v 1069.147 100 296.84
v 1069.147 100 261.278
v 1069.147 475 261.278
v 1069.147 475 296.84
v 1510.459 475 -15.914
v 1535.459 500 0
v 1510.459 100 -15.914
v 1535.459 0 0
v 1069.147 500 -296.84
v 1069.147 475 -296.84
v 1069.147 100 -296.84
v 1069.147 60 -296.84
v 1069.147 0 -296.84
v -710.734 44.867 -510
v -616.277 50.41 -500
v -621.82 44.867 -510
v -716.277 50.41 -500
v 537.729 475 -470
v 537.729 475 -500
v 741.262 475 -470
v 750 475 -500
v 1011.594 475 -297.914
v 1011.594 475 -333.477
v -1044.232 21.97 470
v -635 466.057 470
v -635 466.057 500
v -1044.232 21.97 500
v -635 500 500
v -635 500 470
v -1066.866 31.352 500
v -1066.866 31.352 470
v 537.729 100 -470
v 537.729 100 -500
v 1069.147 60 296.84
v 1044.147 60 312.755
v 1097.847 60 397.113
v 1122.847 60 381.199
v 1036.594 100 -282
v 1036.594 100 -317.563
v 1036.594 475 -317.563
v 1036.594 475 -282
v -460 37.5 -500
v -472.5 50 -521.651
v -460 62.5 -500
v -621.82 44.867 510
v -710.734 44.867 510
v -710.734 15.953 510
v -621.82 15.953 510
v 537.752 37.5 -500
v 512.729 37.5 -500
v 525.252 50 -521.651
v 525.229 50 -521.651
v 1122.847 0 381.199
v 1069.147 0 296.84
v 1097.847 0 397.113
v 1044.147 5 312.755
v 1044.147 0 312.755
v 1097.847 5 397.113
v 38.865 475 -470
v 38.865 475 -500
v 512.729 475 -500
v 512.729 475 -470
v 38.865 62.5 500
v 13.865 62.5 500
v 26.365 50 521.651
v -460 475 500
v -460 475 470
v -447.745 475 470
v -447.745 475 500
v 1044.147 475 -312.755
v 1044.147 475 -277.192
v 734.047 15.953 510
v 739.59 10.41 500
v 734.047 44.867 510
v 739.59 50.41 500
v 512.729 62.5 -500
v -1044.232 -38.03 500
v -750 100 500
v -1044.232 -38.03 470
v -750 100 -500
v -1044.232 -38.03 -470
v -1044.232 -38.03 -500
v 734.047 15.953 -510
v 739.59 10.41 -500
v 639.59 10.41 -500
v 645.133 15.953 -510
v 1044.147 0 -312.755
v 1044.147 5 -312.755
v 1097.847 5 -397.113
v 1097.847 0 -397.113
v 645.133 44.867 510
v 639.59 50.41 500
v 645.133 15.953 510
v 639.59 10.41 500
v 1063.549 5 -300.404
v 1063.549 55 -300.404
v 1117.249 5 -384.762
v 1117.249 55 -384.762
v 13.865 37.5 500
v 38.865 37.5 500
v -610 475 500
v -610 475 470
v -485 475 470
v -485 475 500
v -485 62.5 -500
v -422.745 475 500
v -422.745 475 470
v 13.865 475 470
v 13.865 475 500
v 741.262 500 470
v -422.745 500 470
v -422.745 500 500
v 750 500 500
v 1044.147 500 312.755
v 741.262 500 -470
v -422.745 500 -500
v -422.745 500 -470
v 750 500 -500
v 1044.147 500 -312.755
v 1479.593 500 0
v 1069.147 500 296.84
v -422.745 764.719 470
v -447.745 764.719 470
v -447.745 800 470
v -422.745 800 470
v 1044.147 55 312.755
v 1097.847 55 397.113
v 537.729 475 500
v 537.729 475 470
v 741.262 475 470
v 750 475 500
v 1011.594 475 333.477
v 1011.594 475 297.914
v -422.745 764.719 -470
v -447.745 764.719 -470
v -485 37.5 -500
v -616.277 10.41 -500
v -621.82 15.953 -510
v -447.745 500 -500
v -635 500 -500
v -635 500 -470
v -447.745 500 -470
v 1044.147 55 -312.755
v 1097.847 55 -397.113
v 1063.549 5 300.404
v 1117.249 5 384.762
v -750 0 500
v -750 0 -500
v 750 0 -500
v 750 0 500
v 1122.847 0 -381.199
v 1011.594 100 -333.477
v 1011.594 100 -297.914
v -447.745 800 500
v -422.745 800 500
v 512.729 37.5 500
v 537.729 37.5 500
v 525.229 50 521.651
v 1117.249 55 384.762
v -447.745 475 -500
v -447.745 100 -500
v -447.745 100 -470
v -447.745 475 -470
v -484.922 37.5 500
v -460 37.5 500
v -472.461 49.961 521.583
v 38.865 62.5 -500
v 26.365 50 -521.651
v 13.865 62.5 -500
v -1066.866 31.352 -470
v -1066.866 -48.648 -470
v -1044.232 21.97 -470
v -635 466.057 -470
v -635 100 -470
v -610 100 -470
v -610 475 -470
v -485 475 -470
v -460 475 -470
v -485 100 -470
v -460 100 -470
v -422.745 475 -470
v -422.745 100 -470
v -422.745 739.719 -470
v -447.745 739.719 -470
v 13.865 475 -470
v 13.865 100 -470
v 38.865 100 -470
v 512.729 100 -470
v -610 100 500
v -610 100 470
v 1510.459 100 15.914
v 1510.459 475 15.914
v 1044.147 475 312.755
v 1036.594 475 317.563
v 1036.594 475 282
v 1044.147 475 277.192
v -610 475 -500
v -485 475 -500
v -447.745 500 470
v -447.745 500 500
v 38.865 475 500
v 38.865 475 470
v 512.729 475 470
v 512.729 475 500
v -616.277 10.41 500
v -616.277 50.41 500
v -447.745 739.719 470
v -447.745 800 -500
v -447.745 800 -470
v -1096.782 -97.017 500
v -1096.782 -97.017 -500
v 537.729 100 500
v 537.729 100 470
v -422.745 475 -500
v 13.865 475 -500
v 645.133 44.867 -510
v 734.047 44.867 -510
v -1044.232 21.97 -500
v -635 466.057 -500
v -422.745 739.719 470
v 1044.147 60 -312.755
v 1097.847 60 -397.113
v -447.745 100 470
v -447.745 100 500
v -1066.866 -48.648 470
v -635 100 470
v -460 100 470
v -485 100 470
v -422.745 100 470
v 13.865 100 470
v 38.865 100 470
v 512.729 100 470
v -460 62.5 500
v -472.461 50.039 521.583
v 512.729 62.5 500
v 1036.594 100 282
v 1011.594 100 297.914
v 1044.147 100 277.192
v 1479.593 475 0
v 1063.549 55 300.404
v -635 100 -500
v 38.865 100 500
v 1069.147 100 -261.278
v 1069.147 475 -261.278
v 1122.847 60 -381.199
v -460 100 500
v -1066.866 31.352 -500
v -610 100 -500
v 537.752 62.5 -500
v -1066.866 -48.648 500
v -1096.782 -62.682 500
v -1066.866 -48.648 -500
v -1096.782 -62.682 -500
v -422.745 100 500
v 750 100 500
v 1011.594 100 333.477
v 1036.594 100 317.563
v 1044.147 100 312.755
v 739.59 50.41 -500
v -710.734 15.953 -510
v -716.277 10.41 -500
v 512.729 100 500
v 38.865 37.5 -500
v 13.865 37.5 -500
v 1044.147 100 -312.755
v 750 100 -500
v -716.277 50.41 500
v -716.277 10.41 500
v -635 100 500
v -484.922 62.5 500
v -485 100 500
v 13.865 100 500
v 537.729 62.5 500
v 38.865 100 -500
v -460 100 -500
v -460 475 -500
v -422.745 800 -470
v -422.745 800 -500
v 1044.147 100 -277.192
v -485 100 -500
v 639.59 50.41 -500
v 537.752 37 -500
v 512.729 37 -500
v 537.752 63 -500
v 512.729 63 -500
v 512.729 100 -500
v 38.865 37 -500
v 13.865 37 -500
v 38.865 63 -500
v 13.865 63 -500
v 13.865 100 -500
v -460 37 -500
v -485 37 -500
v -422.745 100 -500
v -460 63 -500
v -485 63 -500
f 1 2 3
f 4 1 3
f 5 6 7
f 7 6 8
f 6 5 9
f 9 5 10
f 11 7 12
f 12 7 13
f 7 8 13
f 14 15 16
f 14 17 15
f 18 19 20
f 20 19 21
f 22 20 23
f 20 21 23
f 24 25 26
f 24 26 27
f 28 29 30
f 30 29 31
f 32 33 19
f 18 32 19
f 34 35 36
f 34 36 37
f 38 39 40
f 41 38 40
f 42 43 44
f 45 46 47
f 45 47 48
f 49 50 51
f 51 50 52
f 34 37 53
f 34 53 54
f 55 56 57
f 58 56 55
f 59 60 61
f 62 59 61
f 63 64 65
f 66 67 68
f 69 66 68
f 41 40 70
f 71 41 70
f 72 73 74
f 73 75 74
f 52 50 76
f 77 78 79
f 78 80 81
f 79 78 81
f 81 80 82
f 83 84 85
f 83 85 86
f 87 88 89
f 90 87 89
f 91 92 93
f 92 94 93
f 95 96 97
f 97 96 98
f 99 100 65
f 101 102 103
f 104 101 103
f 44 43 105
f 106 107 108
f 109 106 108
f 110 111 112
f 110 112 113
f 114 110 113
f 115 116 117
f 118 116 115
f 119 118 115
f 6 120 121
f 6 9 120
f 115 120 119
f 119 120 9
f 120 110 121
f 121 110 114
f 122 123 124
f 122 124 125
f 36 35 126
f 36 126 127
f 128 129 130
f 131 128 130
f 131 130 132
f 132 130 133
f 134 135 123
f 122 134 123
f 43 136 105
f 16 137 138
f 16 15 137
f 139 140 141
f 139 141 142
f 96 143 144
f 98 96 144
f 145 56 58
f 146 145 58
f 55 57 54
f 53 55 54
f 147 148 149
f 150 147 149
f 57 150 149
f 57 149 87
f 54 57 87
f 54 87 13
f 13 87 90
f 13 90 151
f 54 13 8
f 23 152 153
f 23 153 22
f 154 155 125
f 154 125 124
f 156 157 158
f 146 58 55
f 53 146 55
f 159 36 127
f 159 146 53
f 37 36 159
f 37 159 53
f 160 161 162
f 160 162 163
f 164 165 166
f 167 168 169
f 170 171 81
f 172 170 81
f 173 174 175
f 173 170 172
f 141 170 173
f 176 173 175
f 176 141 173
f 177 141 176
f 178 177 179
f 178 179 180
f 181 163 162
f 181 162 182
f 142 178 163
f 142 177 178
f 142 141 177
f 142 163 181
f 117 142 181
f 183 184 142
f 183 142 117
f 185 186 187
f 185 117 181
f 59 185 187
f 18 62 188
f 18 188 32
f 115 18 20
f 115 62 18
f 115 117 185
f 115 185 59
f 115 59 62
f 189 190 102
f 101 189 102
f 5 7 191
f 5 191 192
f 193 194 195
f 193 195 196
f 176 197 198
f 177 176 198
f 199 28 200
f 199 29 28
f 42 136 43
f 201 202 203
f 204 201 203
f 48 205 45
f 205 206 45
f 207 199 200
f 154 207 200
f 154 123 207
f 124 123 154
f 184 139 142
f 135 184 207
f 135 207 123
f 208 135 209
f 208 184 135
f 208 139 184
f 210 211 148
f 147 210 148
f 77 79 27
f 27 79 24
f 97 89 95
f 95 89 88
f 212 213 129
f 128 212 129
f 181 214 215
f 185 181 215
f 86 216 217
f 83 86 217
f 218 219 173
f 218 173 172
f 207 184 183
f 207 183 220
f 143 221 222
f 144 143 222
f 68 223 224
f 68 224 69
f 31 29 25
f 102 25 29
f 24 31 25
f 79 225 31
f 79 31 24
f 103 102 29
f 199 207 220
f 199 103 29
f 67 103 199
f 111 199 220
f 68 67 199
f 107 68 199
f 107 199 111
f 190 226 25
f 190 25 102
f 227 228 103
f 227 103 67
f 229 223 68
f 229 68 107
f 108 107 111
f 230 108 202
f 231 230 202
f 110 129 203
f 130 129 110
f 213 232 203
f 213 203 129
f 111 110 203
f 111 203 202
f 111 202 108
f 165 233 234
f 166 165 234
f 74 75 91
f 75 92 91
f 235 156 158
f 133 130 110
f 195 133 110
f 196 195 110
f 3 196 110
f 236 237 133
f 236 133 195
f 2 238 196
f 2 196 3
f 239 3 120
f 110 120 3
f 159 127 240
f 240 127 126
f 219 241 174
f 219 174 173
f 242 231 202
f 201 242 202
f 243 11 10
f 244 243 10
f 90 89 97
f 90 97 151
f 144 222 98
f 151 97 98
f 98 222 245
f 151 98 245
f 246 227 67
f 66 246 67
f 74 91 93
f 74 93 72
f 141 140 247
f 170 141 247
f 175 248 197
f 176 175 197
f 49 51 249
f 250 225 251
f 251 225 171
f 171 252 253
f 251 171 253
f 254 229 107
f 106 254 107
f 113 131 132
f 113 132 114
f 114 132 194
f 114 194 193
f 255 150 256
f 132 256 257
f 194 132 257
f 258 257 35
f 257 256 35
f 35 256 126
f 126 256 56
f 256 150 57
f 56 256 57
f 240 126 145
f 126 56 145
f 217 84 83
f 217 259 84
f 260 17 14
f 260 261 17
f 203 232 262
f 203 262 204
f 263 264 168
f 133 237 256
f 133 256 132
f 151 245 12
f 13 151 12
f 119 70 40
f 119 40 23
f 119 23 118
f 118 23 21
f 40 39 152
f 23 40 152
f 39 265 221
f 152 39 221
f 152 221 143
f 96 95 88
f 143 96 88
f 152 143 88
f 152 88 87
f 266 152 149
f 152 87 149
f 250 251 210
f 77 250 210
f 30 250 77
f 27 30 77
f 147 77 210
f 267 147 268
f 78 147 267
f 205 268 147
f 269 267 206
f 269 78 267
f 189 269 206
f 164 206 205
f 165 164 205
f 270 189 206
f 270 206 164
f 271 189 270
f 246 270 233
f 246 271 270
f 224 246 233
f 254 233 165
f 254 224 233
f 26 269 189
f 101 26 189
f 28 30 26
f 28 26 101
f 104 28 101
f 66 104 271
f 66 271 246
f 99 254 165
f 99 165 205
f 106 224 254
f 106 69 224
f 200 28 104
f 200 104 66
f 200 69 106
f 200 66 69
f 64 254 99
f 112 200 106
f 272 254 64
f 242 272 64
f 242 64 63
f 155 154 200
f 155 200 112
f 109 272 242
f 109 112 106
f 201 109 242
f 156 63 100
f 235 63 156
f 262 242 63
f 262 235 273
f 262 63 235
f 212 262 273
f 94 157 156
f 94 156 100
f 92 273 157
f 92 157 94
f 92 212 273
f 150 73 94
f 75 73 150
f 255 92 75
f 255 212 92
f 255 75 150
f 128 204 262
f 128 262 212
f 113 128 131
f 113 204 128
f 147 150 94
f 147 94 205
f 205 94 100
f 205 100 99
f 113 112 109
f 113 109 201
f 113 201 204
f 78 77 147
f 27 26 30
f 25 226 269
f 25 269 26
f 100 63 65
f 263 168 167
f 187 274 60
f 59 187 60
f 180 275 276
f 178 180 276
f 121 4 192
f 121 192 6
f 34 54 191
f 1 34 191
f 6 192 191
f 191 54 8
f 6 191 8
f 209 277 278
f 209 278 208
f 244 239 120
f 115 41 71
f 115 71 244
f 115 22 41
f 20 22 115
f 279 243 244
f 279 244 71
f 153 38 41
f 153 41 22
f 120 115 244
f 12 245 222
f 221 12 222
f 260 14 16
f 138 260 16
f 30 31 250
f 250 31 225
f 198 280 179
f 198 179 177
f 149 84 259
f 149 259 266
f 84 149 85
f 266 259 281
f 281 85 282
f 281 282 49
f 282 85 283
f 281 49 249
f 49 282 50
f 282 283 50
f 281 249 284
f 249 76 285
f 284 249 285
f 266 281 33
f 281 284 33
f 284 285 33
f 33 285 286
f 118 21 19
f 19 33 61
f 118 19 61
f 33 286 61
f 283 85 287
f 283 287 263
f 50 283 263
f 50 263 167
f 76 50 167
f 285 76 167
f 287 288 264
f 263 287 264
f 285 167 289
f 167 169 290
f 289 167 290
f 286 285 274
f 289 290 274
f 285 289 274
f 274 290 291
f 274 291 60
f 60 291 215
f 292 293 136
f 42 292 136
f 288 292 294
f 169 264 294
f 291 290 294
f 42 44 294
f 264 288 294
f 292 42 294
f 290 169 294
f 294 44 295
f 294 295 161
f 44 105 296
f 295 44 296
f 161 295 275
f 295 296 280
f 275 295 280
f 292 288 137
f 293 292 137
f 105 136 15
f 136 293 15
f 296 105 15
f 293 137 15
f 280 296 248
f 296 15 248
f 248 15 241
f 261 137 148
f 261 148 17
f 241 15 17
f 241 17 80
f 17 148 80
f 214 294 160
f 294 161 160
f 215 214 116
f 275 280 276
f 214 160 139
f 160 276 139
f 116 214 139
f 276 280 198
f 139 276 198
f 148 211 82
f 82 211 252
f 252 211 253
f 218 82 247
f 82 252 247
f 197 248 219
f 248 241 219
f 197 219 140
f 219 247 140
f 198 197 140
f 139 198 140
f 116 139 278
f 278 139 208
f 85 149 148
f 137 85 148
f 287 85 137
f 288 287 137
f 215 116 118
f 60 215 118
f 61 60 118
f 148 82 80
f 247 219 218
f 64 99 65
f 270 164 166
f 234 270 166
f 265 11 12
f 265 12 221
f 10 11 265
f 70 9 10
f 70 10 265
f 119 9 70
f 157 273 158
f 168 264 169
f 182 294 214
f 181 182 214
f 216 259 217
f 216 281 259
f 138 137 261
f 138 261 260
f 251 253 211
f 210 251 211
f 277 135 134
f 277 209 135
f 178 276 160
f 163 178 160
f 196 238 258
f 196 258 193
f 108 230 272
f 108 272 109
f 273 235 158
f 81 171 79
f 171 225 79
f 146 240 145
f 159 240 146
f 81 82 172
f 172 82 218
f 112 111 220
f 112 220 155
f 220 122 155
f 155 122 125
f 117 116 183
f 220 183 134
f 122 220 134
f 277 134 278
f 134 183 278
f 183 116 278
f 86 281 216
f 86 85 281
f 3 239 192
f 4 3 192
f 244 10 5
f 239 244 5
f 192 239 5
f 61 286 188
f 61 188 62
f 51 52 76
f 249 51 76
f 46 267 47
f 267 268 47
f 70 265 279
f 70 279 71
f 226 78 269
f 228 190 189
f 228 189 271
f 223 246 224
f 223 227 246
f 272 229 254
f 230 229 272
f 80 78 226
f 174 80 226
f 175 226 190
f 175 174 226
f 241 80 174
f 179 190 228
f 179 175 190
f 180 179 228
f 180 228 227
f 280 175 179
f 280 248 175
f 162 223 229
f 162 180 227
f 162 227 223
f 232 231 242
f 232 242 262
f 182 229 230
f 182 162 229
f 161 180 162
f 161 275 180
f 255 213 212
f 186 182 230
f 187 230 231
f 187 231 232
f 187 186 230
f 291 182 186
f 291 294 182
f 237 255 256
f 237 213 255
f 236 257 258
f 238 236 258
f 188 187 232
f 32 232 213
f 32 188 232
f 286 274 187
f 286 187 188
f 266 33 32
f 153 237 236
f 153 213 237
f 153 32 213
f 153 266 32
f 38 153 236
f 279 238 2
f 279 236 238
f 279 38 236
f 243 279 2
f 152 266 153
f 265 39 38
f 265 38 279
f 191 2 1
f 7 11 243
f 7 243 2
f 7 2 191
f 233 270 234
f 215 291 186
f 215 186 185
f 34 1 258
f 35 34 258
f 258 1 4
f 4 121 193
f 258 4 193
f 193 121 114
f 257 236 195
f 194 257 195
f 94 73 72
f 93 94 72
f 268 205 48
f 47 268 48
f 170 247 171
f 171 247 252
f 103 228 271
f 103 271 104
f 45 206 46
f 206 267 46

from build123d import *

# Parameters (mm, degrees)
BOSS_EXTRUDE1_DEPTH      = 500
BOSS_EXTRUDE2_DEPTH      = 500
BOSS_EXTRUDE2_DEPTH_BACK = 500
CUT_EXTRUDE1_START       = -500
CUT_EXTRUDE1_OUTLINE_W   = 473.864747831
CUT_EXTRUDE1_OUTLINE_H   = 375
CUT_EXTRUDE1_OUTLINE_W_2 = 7.552750907
CUT_EXTRUDE1_OUTLINE_W_3 = 441.311996924
CUT_EXTRUDE1_OUTLINE_W_4 = 436.609859473
CUT_EXTRUDE1_OUTLINE_W_5 = 473.864747832
CUT_EXTRUDE1_OUTLINE_W_6 = 12.254888358
CUT_EXTRUDE1_OUTLINE_W_7 = 125
CUT_EXTRUDE1_DEPTH       = 1000
BOSS_EXTRUDE3_DEPTH      = 100
CUT_EXTRUDE4_DEPTH       = 470
BOSS_EXTRUDE5_DEPTH      = 500
BOSS_EXTRUDE5_DEPTH_BACK = 500
CUT_EXTRUDE7_DEPTH       = 470
SKETCH10_W               = 1000
SKETCH10_H               = 25
BOSS_EXTRUDE6_DEPTH      = 25
SKETCH11_W               = 25
SKETCH11_H               = 25
SKETCH11_W_2             = 24.921787331
BOSS_EXTRUDE7_DEPTH      = 25
BOSS_EXTRUDE7_TAPER      = 30
BOSS_EXTRUDE8_START      = 525.229495663
BOSS_EXTRUDE8_DEPTH      = 0.022340747
BOSS_EXTRUDE8_START_2    = -485
BOSS_EXTRUDE8_2_DEPTH    = 25
BOSS_EXTRUDE8_START_3    = 13.864747831
BOSS_EXTRUDE8_3_DEPTH    = 25
BOSS_EXTRUDE8_START_4    = 512.729495663
BOSS_EXTRUDE8_4_DEPTH    = 25.022340747
BOSS_EXTRUDE8_START_5    = 37
BOSS_EXTRUDE8_5_DEPTH    = 26
BOSS_EXTRUDE10_DEPTH     = 500
CUT_EXTRUDE8_DEPTH       = 440
CUT_EXTRUDE9_DEPTH       = 23
CUT_EXTRUDE10_DEPTH      = 23
SKETCH20_W               = 100
SKETCH20_H               = 40
BOSS_EXTRUDE11_DEPTH     = 10
BOSS_EXTRUDE11_TAPER     = 29
SKETCH22_W               = 100
SKETCH22_H               = 40
BOSS_EXTRUDE12_DEPTH     = 10
BOSS_EXTRUDE12_TAPER     = 29


with BuildPart() as part:
    # Sketch3 → Boss-Extrude1 (new body)
    with BuildSketch(Plane(origin=(0, 0, 0), x_dir=(1, 0, 0), z_dir=(0, 1, 0))):
        Polygon((750, -500), (1535.458991325, 0), (750, 500), (-750, 500), (-750, -500), align=None)
        Polygon((741.261584038, -470), (1479.593035884, 0), (741.261584038, 470), (-720, 470), (-720, -470), align=None, mode=Mode.SUBTRACT)
    extrude(amount=BOSS_EXTRUDE1_DEPTH)

    # Sketch4 → Boss-Extrude2 (add, two sides: drawn at the far end of the back side and taken through both)
    with BuildSketch(Plane.XY.offset(-BOSS_EXTRUDE2_DEPTH_BACK)):
        Polygon((-750, 0), (-750, 100), (-1044.23243351, -38.029978885), (-1044.23243351, 21.970021115), (-635, 466.05675301), (-635, 500), (-1066.865697626, 31.352330432), (-1066.865697626, -48.647669568), (-1096.782201963, -62.68206548), (-1096.782201963, -97.017235637), align=None)
    extrude(amount=BOSS_EXTRUDE2_DEPTH + BOSS_EXTRUDE2_DEPTH_BACK)

    # Cut-Extrude1: read off the stored shape, not the designer's step
    # Cut-Extrude1 outline → Cut-Extrude1 (cut)
    with BuildSketch(Plane.XY.offset(CUT_EXTRUDE1_START)):
        Polygon((-635, 100), (-635, 466.05675301), (-750, 341.262210872), (-750, 100), align=None)
        with Locations((774.661869579, 287.5)):
            Rectangle(CUT_EXTRUDE1_OUTLINE_W, CUT_EXTRUDE1_OUTLINE_H)
        with Locations((1040.370618948, 287.5)):
            Rectangle(CUT_EXTRUDE1_OUTLINE_W_2, CUT_EXTRUDE1_OUTLINE_H)
        with Locations((1289.802992863, 287.5)):
            Rectangle(CUT_EXTRUDE1_OUTLINE_W_3, CUT_EXTRUDE1_OUTLINE_H)
        with Locations((-204.440181906, 287.5)):
            Rectangle(CUT_EXTRUDE1_OUTLINE_W_4, CUT_EXTRUDE1_OUTLINE_H)
        with Locations((275.797121747, 287.5)):
            Rectangle(CUT_EXTRUDE1_OUTLINE_W_5, CUT_EXTRUDE1_OUTLINE_H)
        with Locations((-453.872555821, 287.5)):
            Rectangle(CUT_EXTRUDE1_OUTLINE_W_6, CUT_EXTRUDE1_OUTLINE_H)
        with Locations((-547.5, 287.5)):
            Rectangle(CUT_EXTRUDE1_OUTLINE_W_7, CUT_EXTRUDE1_OUTLINE_H)
        Polygon((-750, 375.205457862), (-635, 500), (-750, 500), align=None)
    extrude(amount=CUT_EXTRUDE1_DEPTH, mode=Mode.SUBTRACT)

    # Sketch3<6> → Boss-Extrude3 (add)
    with BuildSketch(Plane(origin=(0, 0, 0), x_dir=(1, 0, 0), z_dir=(0, 1, 0))):
        Polygon((750, -500), (1535.458991325, 0), (750, 500), (-750, 500), (-750, -500), align=None)
    extrude(amount=BOSS_EXTRUDE3_DEPTH)

    # Sketch4<6> → Cut-Extrude4 (cut, symmetric)
    with BuildSketch(Plane.XY):
        Polygon((-1066.865697626, -48.647669568), (-1044.23243351, -38.029978885), (-1044.23243351, 21.970021115), (-750, 341.262210872), (-635, 466.05675301), (-635, 500), (-750, 375.205457862), (-1066.865697626, 31.352330432), align=None)
    extrude(amount=CUT_EXTRUDE4_DEPTH, both=True, mode=Mode.SUBTRACT)

    # Sketch4<7> → Boss-Extrude5 (add, two sides: drawn at the far end of the back side and taken through both)
    with BuildSketch(Plane.XY.offset(-BOSS_EXTRUDE5_DEPTH_BACK)):
        Polygon((-447.745111642, 475), (-447.745111642, 100), (-422.745111642, 100), (-422.745111642, 475), (-422.745111642, 500), (-422.745111642, 800), (-447.745111642, 800), (-447.745111642, 500), align=None)
    extrude(amount=BOSS_EXTRUDE5_DEPTH + BOSS_EXTRUDE5_DEPTH_BACK)

    # Sketch4<8> → Cut-Extrude7 (cut, symmetric)
    with BuildSketch(Plane.XY):
        Polygon((-447.745111642, 475), (-447.745111642, 100), (-422.745111642, 100), (-422.745111642, 475), (-422.745111642, 500), (-422.745111642, 800), (-447.745111642, 800), (-447.745111642, 500), align=None)
    extrude(amount=CUT_EXTRUDE7_DEPTH, both=True, mode=Mode.SUBTRACT)

    # Sketch10 → Boss-Extrude6 (add)
    with BuildSketch(Plane.ZY.offset(447.745111642)):
        with Locations((0, 752.218873566)):
            Rectangle(SKETCH10_W, SKETCH10_H)
    extrude(amount=-BOSS_EXTRUDE6_DEPTH)

    # Sketch11 → Boss-Extrude7 (add)
    with BuildSketch(Plane.XY.offset(500)):
        with Locations((525.229495663, 50)):
            Rectangle(SKETCH11_W, SKETCH11_H)
        with Locations((26.364747831, 50)):
            Rectangle(SKETCH11_W, SKETCH11_H)
        with Locations((-472.460893666, 50)):
            Rectangle(SKETCH11_W_2, SKETCH11_H)
    extrude(amount=BOSS_EXTRUDE7_DEPTH, taper=BOSS_EXTRUDE7_TAPER)

    # Boss-Extrude8: read off the stored shape, not the designer's step
    # Boss-Extrude8 outline → Boss-Extrude8 (add)
    with BuildSketch(Plane.YZ.offset(BOSS_EXTRUDE8_START)):
        Polygon((62.5, -500), (37.5, -500), (50, -521.650635095), align=None)
    extrude(amount=BOSS_EXTRUDE8_DEPTH)

    # Boss-Extrude8 2 outline → Boss-Extrude8 2 (add)
    with BuildSketch(Plane.YZ.offset(BOSS_EXTRUDE8_START_2)):
        Polygon((62.5, -500), (37.5, -500), (50, -521.650635095), align=None)
    extrude(amount=BOSS_EXTRUDE8_2_DEPTH)

    # Boss-Extrude8 3 outline → Boss-Extrude8 3 (add)
    with BuildSketch(Plane.YZ.offset(BOSS_EXTRUDE8_START_3)):
        Polygon((62.5, -500), (37.5, -500), (50, -521.650635095), align=None)
    extrude(amount=BOSS_EXTRUDE8_3_DEPTH)

    # Boss-Extrude8 4 outline → Boss-Extrude8 4 (add)
    with BuildSketch(Plane.YZ.offset(BOSS_EXTRUDE8_START_4)):
        Polygon((62.5, -500), (37.5, -500), (50, -521.650635095), align=None)
    extrude(amount=BOSS_EXTRUDE8_4_DEPTH)

    # Boss-Extrude8 5 outline → Boss-Extrude8 5 (cut)
    with BuildSketch(Plane(origin=(0, 0, 0), x_dir=(1, 0, 0), z_dir=(0, 1, 0)).offset(BOSS_EXTRUDE8_START_5)):
        Polygon((512.729495663, 500), (525.229495663, 521.650635095), (525.240666036, 521.669982749), (524.472780219, 523), (512.729495663, 523), align=None)
        Polygon((526.008551854, 523), (525.240666036, 521.669982749), (525.25183641, 521.650635095), (537.75183641, 500), (537.75183641, 523), align=None)
        Polygon((38.864747831, 500), (38.864747831, 523), (13.864747831, 523), (13.864747831, 500), (26.364747831, 521.650635095), align=None)
        Polygon((-460, 500), (-460, 523), (-485, 523), (-485, 500), (-472.5, 521.650635095), align=None)
    extrude(amount=BOSS_EXTRUDE8_5_DEPTH, mode=Mode.SUBTRACT)

    # Sketch15 → Boss-Extrude10 (add)
    with BuildSketch(Plane(origin=(0, 500, 0), x_dir=(1, 0, 0), z_dir=(0, 1, 0))):
        Polygon((1069.146994401, -296.84044748), (1044.146994401, -312.754709253), (1097.846962052, -397.112954104), (1122.846962052, -381.198692331), align=None)
        Polygon((1044.146994401, 312.754709253), (1097.846962052, 397.112954104), (1122.846962052, 381.198692331), (1069.146994401, 296.84044748), align=None)
    extrude(amount=-BOSS_EXTRUDE10_DEPTH)

    # Sketch15<2> → Cut-Extrude8 (cut)
    with BuildSketch(Plane(origin=(0, 500, 0), x_dir=(1, 0, 0), z_dir=(0, 1, 0))):
        Polygon((1069.146994401, -296.84044748), (1044.146994401, -312.754709253), (1097.846962052, -397.112954104), (1122.846962052, -381.198692331), align=None)
        Polygon((1044.146994401, 312.754709253), (1097.846962052, 397.112954104), (1122.846962052, 381.198692331), (1069.146994401, 296.84044748), align=None)
    extrude(amount=-CUT_EXTRUDE8_DEPTH, mode=Mode.SUBTRACT)

    # Sketch17 → Cut-Extrude9 (cut)
    with BuildSketch(Plane(origin=(601.368753994, 0, -382.813590929), x_dir=(0.5369996765096833, 0, 0.8435824485066624), z_dir=(-0.8435824485066624, 0, 0.5369996765096833))):
        Polygon((824.540981636, 5), (919.540981636, 5), (968.552500425, 5), (968.552500425, 55), (924.540981636, 55), (824.540981636, 55), align=None)
    extrude(amount=-CUT_EXTRUDE9_DEPTH, mode=Mode.SUBTRACT)

    # Sketch19 → Cut-Extrude10 (cut)
    with BuildSketch(Plane(origin=(601.368753994, 0, 382.813590929), x_dir=(-0.5369996765096847, 0, 0.8435824485066614), z_dir=(-0.8435824485066615, 0, -0.5369996765096847))):
        Polygon((-829.540981636, 55), (-824.540981636, 55), (-824.540981636, 5), (-829.540981636, 5), (-919.540981636, 5), (-930.414815986, 5), (-930.414815986, 55), (-919.540981636, 55), align=None)
    extrude(amount=-CUT_EXTRUDE10_DEPTH, mode=Mode.SUBTRACT)

    # Sketch20 → Boss-Extrude11 (add)
    with BuildSketch(Plane.XY.offset(500)):
        with Locations((689.590277632, 30.409722368)):
            Rectangle(SKETCH20_W, SKETCH20_H)
    boss_extrude11 = extrude(amount=BOSS_EXTRUDE11_DEPTH, taper=BOSS_EXTRUDE11_TAPER)

    # Mirror1: Boss-Extrude11 across plane
    add(boss_extrude11.mirror(Plane.XY))

    # Sketch22 → Boss-Extrude12 (add)
    with BuildSketch(Plane.XY.offset(500)):
        with Locations((-666.276639524, 30.409722368)):
            Rectangle(SKETCH22_W, SKETCH22_H)
    boss_extrude12 = extrude(amount=BOSS_EXTRUDE12_DEPTH, taper=BOSS_EXTRUDE12_TAPER)

    # Mirror2: Boss-Extrude12 across plane
    add(boss_extrude12.mirror(Plane.XY))


solid = part.part
